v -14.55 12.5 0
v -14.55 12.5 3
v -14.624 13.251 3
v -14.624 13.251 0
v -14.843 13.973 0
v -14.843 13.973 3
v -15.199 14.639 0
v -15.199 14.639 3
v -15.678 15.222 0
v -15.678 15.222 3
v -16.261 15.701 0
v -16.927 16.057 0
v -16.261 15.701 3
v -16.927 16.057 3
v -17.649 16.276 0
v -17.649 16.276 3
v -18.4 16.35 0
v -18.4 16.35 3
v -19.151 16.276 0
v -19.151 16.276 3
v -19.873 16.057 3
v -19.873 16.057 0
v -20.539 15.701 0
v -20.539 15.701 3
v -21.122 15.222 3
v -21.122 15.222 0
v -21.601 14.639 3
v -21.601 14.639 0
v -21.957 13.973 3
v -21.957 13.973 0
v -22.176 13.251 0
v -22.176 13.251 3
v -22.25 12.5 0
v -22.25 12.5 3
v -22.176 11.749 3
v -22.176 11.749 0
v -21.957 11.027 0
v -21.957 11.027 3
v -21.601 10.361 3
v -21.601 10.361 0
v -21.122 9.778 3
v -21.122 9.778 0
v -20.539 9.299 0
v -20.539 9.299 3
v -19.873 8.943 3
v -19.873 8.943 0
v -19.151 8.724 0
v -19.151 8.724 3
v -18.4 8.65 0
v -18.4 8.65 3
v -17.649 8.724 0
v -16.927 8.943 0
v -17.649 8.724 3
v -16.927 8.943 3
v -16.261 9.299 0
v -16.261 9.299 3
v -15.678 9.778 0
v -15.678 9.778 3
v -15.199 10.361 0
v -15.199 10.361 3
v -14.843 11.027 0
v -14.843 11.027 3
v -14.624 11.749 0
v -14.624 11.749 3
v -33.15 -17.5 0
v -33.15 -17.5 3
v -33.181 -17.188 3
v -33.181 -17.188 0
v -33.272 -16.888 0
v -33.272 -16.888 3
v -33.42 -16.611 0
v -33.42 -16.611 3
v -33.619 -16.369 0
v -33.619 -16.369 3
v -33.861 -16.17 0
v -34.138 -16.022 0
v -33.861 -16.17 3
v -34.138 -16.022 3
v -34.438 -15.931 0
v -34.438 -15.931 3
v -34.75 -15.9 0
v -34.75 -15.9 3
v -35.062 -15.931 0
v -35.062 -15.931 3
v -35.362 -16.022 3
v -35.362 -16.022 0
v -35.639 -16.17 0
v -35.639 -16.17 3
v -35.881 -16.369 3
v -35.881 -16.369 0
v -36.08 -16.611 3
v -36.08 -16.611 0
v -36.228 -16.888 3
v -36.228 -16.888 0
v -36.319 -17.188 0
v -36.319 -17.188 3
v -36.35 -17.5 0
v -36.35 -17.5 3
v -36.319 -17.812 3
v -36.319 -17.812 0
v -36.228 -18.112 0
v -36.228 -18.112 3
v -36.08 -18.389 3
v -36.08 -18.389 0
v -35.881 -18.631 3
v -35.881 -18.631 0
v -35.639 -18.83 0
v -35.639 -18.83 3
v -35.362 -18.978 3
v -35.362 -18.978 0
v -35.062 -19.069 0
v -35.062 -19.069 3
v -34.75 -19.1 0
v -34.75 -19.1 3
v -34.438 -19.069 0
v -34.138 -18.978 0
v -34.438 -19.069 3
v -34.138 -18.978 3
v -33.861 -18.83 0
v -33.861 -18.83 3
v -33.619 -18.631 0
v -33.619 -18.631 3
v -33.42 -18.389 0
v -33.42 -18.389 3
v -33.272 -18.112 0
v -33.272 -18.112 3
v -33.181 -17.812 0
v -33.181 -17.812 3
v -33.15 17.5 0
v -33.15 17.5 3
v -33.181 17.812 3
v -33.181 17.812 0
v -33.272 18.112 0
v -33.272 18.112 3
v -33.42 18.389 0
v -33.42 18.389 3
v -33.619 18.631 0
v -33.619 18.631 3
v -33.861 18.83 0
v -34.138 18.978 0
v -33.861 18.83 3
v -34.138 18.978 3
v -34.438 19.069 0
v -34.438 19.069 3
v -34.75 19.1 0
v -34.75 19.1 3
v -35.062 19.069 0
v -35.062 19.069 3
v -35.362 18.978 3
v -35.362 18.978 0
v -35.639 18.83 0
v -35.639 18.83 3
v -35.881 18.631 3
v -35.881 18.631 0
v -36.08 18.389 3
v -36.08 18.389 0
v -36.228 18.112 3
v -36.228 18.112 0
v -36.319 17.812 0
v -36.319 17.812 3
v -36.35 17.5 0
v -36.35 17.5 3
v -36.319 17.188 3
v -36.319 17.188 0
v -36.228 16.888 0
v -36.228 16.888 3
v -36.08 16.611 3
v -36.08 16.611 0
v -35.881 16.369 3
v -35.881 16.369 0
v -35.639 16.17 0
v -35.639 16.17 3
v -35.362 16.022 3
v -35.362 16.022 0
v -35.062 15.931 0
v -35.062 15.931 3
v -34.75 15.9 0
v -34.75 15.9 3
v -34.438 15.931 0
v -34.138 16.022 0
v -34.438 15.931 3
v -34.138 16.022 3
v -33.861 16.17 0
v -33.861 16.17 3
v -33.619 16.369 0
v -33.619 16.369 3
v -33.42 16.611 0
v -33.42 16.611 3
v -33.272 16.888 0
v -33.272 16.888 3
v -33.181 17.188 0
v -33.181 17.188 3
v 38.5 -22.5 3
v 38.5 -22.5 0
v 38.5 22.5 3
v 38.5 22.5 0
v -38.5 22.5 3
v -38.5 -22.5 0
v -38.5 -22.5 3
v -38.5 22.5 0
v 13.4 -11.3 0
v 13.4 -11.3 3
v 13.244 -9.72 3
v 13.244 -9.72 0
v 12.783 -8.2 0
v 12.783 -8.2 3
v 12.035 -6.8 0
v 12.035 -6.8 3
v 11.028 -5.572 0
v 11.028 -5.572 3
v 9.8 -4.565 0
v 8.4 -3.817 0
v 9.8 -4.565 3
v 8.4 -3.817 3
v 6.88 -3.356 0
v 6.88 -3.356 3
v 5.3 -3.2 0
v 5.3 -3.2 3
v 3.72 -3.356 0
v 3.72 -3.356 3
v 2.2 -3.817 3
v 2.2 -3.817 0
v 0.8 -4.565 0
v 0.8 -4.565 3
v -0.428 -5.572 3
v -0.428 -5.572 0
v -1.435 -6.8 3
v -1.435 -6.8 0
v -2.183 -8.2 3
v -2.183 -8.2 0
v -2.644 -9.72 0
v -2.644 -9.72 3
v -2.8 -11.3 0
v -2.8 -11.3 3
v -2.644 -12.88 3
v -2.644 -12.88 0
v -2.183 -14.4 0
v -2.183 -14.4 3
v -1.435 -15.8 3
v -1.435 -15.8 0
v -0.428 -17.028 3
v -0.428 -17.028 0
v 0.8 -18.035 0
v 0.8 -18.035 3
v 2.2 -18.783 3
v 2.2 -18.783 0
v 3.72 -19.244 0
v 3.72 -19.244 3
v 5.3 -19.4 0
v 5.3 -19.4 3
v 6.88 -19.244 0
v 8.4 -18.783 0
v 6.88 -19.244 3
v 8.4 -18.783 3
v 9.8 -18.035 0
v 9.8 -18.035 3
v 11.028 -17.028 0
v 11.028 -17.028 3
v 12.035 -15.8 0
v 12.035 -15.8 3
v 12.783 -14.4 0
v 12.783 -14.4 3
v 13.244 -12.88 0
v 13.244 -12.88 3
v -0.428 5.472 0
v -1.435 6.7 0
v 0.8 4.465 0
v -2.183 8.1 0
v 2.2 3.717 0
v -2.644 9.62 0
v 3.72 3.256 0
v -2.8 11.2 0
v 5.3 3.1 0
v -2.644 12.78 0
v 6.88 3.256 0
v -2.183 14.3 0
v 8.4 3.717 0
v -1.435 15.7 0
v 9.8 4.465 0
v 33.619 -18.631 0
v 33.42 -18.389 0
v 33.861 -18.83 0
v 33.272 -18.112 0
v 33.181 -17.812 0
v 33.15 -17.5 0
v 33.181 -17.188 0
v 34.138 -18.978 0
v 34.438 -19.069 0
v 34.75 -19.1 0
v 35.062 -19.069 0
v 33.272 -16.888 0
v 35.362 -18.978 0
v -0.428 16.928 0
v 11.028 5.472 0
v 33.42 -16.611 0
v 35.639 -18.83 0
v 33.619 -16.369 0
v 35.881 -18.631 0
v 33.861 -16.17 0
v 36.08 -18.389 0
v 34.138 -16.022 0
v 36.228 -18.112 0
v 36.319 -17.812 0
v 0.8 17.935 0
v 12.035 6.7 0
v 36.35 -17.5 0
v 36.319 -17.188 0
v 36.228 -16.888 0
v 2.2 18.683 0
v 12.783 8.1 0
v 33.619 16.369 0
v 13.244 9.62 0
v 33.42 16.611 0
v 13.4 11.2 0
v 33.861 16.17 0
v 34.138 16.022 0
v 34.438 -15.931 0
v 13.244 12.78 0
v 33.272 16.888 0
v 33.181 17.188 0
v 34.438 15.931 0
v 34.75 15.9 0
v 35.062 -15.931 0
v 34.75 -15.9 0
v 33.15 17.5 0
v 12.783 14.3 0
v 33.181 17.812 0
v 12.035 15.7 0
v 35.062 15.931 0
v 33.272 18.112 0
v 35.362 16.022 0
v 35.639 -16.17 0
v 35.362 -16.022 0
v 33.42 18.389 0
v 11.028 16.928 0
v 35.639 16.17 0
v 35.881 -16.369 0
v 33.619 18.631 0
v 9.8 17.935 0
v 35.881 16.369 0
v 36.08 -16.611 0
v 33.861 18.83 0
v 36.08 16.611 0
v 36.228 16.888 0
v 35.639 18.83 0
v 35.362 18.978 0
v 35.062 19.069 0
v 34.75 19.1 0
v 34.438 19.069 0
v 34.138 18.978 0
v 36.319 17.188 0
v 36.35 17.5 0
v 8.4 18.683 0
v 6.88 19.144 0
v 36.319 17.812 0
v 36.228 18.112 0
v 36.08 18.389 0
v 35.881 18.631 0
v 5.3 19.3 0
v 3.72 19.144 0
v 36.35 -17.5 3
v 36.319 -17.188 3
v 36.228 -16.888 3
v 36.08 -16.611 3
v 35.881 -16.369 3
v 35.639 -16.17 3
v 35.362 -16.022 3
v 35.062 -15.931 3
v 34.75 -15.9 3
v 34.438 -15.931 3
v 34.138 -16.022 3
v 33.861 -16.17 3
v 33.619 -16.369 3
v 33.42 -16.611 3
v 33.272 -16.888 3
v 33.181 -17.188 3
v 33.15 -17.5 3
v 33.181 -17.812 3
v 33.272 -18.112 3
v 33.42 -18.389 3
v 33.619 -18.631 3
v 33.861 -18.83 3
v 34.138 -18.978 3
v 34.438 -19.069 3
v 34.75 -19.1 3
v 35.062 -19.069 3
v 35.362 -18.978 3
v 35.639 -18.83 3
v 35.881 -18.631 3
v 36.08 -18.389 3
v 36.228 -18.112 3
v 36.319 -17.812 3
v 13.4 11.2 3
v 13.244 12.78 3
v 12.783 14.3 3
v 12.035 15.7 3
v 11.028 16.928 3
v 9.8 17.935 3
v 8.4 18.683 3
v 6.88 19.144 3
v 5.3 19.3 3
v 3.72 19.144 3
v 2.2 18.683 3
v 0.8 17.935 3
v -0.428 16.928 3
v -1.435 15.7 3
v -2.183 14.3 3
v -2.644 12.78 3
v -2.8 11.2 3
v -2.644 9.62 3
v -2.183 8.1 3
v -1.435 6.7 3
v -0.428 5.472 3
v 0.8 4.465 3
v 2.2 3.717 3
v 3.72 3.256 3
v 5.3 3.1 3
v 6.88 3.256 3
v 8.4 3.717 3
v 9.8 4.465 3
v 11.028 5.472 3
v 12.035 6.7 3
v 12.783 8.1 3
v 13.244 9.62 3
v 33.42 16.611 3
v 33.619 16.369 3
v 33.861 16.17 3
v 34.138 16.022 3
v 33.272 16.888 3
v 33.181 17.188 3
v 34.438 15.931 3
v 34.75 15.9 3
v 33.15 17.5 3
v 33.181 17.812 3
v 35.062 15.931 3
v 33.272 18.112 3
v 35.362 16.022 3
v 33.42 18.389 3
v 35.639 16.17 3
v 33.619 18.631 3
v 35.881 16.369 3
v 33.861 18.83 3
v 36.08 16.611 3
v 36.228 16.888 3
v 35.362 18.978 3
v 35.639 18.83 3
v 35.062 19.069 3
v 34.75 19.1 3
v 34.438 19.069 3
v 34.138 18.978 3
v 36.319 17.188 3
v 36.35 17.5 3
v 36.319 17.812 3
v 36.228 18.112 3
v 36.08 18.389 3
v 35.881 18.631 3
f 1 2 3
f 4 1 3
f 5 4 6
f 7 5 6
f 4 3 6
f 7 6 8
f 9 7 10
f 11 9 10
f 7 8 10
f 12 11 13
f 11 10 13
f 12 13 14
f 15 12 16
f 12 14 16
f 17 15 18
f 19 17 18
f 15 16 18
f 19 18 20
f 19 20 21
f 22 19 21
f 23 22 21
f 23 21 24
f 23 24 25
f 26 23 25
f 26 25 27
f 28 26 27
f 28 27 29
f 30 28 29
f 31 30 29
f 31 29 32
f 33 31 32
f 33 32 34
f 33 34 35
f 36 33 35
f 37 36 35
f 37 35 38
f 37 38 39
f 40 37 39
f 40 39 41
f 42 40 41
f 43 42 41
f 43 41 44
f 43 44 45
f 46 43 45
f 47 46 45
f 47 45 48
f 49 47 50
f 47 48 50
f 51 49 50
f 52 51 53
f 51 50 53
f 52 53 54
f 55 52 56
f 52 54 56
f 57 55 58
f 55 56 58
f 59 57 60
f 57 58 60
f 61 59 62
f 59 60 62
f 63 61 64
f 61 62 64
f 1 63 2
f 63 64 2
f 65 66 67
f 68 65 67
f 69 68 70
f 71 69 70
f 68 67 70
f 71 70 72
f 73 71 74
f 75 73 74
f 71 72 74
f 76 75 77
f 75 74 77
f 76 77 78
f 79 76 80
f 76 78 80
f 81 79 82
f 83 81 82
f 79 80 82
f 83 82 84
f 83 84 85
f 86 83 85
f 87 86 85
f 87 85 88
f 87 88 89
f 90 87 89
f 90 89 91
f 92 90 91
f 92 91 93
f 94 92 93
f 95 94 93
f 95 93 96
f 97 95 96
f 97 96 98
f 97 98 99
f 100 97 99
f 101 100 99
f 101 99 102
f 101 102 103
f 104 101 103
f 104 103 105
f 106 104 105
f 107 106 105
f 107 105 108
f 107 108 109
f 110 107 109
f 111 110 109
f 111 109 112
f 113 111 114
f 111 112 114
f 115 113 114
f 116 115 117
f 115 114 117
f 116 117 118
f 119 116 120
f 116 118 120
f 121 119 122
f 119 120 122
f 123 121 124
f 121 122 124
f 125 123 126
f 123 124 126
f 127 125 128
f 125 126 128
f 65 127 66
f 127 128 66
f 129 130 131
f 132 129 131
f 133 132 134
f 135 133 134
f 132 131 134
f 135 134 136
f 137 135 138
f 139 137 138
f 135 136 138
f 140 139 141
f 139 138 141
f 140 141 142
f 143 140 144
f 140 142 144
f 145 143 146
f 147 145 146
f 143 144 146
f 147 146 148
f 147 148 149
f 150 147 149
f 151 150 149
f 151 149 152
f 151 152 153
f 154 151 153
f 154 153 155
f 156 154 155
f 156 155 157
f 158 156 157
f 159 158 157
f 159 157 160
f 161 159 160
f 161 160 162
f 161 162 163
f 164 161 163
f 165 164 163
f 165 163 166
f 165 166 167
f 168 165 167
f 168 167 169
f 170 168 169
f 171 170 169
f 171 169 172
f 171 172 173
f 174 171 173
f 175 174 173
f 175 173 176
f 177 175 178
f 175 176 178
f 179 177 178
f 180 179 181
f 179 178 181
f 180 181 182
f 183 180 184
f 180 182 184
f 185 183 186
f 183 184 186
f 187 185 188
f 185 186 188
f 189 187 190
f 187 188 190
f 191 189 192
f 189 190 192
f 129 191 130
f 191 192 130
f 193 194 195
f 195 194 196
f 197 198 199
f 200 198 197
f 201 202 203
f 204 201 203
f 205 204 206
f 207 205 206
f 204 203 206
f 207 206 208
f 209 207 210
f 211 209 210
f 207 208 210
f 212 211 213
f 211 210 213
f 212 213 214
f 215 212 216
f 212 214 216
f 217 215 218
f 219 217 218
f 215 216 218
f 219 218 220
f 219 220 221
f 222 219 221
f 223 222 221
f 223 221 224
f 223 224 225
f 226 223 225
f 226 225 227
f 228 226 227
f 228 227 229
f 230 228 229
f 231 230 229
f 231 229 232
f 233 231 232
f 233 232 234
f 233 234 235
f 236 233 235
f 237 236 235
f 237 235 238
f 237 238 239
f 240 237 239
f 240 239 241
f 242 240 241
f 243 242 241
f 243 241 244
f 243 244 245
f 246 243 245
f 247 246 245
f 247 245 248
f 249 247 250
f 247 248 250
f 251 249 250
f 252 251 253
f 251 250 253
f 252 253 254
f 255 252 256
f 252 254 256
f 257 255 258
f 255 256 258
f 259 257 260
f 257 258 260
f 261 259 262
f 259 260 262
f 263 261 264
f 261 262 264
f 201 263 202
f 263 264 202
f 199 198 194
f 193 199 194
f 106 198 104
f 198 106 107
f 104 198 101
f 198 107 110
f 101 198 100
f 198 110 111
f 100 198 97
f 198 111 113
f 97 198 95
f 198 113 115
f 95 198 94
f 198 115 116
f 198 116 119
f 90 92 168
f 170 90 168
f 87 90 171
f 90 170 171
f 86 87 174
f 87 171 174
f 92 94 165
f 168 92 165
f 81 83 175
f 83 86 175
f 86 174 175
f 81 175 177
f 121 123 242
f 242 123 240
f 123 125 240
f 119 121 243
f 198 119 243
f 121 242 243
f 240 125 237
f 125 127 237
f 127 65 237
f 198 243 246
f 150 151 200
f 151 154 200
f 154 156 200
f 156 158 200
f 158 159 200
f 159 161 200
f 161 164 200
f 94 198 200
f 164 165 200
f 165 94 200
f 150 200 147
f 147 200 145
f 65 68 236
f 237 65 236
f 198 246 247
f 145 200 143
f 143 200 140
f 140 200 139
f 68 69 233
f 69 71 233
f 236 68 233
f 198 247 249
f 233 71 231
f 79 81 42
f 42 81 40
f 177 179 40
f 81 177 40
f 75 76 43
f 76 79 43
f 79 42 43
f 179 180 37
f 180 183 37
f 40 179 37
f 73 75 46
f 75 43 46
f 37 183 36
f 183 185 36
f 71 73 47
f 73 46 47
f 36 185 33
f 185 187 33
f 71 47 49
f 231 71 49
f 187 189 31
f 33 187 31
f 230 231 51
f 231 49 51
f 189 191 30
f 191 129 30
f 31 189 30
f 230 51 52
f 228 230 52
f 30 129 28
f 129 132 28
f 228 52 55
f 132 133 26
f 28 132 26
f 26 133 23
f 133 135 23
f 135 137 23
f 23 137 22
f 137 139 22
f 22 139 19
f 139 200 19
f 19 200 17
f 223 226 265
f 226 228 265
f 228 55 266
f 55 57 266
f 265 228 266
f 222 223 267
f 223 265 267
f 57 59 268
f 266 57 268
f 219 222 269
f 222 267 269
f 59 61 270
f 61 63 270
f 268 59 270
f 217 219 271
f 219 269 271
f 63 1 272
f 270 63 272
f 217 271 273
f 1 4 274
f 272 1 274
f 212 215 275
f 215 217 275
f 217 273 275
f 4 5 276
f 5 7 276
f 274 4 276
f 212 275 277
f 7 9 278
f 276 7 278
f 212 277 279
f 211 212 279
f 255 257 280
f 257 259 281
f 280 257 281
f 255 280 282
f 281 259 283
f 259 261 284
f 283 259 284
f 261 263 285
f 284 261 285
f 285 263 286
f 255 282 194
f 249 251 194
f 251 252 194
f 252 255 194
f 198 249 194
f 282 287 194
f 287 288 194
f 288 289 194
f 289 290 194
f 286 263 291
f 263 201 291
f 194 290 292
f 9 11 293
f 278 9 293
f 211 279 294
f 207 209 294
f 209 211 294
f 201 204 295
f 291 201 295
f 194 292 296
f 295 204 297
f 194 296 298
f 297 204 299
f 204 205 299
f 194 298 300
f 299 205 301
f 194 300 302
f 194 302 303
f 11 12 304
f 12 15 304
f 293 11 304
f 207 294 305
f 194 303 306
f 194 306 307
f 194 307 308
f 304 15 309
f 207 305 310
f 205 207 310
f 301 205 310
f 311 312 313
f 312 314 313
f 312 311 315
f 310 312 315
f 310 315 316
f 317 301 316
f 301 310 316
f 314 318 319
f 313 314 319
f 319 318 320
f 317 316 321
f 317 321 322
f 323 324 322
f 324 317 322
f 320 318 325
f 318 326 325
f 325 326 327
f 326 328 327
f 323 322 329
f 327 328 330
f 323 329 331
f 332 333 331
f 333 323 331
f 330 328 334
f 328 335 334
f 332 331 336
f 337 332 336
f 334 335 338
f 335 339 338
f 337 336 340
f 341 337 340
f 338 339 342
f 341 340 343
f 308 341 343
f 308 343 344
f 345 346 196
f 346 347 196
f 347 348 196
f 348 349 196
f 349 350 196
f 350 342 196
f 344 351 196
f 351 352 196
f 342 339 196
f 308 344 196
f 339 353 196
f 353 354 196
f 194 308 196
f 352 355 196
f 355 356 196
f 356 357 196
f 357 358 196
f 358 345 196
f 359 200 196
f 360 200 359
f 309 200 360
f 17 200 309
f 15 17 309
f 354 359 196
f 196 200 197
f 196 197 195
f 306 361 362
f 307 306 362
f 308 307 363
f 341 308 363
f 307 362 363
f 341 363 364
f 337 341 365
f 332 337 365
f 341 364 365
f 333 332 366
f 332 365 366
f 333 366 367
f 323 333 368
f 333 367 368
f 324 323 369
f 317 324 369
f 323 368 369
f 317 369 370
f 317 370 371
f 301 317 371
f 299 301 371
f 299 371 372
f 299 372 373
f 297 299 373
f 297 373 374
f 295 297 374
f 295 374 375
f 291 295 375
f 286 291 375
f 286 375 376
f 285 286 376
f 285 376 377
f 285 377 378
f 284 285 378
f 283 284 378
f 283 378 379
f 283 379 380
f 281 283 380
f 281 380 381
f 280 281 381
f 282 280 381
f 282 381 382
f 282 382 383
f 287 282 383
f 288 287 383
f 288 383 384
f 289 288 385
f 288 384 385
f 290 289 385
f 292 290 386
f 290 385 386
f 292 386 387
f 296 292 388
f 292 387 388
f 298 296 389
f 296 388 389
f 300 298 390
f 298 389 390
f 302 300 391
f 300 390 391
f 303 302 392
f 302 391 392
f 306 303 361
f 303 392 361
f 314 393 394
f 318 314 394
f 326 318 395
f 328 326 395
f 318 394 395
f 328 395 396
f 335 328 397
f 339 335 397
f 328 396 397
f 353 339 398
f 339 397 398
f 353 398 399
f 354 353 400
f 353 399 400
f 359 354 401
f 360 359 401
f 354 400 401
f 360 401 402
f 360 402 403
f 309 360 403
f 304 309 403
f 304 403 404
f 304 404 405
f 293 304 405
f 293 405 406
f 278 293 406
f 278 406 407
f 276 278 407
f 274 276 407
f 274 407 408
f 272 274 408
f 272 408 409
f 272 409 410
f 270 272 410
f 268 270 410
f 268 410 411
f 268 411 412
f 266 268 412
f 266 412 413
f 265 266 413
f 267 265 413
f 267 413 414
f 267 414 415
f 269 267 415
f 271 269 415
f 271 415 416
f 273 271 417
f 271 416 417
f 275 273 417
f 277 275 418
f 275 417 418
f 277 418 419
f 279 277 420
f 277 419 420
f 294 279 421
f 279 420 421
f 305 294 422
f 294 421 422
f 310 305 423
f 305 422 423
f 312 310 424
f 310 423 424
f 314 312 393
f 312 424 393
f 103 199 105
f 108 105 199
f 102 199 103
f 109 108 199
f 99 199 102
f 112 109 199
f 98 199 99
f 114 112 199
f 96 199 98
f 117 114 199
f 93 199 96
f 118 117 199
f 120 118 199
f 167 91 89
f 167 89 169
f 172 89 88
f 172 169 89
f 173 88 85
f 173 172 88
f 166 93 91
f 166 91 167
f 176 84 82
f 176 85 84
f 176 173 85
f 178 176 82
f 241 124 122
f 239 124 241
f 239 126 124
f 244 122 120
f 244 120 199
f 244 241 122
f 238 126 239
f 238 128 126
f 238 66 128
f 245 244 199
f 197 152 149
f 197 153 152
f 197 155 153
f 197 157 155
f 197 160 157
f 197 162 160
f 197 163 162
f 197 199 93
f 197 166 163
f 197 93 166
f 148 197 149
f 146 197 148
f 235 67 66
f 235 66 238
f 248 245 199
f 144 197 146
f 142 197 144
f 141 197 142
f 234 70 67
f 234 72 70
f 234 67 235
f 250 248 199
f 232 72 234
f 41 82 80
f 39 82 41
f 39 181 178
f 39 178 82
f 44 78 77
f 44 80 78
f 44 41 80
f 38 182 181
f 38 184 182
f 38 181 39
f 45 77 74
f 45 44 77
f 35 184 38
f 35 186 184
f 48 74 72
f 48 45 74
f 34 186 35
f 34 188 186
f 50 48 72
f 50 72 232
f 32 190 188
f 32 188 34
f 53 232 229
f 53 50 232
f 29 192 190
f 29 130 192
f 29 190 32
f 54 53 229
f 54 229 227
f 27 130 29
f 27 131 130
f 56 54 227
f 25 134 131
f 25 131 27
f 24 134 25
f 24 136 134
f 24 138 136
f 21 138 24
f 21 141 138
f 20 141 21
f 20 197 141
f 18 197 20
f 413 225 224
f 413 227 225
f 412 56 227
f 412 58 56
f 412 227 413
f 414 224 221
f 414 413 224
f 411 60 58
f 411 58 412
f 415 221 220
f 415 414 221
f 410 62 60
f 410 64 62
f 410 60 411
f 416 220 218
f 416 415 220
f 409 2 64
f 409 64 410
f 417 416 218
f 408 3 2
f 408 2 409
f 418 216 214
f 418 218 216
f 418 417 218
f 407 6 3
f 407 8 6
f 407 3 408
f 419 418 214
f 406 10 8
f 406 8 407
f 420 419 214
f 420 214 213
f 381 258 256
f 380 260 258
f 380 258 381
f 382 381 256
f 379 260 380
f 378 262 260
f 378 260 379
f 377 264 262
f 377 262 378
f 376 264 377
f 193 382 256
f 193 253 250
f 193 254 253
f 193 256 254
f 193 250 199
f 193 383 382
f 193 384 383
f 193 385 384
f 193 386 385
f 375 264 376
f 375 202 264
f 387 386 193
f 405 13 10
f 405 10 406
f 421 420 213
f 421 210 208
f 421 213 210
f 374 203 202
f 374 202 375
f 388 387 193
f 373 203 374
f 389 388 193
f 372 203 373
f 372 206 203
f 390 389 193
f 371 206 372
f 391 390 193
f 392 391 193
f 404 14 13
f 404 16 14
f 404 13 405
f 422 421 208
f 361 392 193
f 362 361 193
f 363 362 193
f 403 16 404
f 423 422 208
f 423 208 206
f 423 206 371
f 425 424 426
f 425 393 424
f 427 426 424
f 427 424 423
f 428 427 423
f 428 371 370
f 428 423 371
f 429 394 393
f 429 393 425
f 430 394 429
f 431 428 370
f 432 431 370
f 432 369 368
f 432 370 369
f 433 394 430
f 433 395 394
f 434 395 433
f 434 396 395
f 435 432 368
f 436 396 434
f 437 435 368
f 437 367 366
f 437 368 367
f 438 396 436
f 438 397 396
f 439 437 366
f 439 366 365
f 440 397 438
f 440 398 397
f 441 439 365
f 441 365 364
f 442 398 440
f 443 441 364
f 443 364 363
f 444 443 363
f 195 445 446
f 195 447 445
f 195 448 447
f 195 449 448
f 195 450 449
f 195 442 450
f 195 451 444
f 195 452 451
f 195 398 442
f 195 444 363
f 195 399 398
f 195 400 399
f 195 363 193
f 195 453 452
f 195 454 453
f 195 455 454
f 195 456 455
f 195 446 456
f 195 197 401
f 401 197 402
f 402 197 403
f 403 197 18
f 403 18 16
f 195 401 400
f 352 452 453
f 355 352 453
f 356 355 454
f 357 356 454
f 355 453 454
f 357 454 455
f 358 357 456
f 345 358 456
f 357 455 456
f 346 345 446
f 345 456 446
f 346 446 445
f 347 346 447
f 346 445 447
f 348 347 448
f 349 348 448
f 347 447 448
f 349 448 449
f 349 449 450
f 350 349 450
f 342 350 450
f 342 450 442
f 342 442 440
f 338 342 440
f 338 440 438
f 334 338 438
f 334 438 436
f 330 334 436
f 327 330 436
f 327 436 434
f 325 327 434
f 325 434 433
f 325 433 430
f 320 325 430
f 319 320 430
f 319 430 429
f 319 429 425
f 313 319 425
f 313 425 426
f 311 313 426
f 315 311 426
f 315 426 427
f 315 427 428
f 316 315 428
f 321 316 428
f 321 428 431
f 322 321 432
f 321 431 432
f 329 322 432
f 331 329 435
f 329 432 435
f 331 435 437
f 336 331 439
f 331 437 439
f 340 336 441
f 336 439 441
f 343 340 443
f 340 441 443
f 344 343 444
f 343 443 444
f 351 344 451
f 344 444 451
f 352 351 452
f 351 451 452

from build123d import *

# Parameters (mm, degrees)
CROQUIS1_W              = 77
CROQUIS1_H              = 45
SALIENTE_EXTRUIR1_DEPTH = 3
CORTAR_EXTRUIR1_REACH   = 5
CROQUIS2_R              = 8.1
CROQUIS2_R_2            = 3.85
CROQUIS2_R_3            = 1.6


with BuildPart() as part:
    # Croquis1 → Saliente-Extruir1 (new body)
    with BuildSketch(Plane.XY):
        Rectangle(CROQUIS1_W, CROQUIS1_H)
    extrude(amount=SALIENTE_EXTRUIR1_DEPTH)

    # Croquis2 → Cortar-Extruir1 (cut, up to next)
    with BuildSketch(Plane.XY.offset(3), mode=Mode.PRIVATE) as cortar_extruir1_sk1:
        with Locations((5.3, 11.2)):
            Circle(CROQUIS2_R)
    cortar_extruir1_tool1 = extrude(cortar_extruir1_sk1.sketch, amount=-CORTAR_EXTRUIR1_REACH, mode=Mode.PRIVATE) & part.part
    add(cortar_extruir1_tool1.solids().sort_by_distance((5.3, 11.2, 3))[0], mode=Mode.SUBTRACT)
    # Croquis2 → Cortar-Extruir1 (cut, up to next)
    with BuildSketch(Plane.XY.offset(3), mode=Mode.PRIVATE) as cortar_extruir1_sk2:
        with Locations((5.3, -11.3)):
            Circle(CROQUIS2_R)
    cortar_extruir1_tool2 = extrude(cortar_extruir1_sk2.sketch, amount=-CORTAR_EXTRUIR1_REACH, mode=Mode.PRIVATE) & part.part
    add(cortar_extruir1_tool2.solids().sort_by_distance((5.3, -11.3, 3))[0], mode=Mode.SUBTRACT)
    # Croquis2 → Cortar-Extruir1 (cut, up to next)
    with BuildSketch(Plane.XY.offset(3), mode=Mode.PRIVATE) as cortar_extruir1_sk3:
        with Locations((-18.4, 12.5)):
            Circle(CROQUIS2_R_2)
    cortar_extruir1_tool3 = extrude(cortar_extruir1_sk3.sketch, amount=-CORTAR_EXTRUIR1_REACH, mode=Mode.PRIVATE) & part.part
    add(cortar_extruir1_tool3.solids().sort_by_distance((-18.4, 12.5, 3))[0], mode=Mode.SUBTRACT)
    # Croquis2 → Cortar-Extruir1 (cut, up to next)
    with BuildSketch(Plane.XY.offset(3), mode=Mode.PRIVATE) as cortar_extruir1_sk4:
        with Locations((-34.75, 17.5)):
            Circle(CROQUIS2_R_3)
    cortar_extruir1_tool4 = extrude(cortar_extruir1_sk4.sketch, amount=-CORTAR_EXTRUIR1_REACH, mode=Mode.PRIVATE) & part.part
    add(cortar_extruir1_tool4.solids().sort_by_distance((-34.75, 17.5, 3))[0], mode=Mode.SUBTRACT)
    # Croquis2 → Cortar-Extruir1 (cut, up to next)
    with BuildSketch(Plane.XY.offset(3), mode=Mode.PRIVATE) as cortar_extruir1_sk5:
        with Locations((34.75, 17.5)):
            Circle(CROQUIS2_R_3)
    cortar_extruir1_tool5 = extrude(cortar_extruir1_sk5.sketch, amount=-CORTAR_EXTRUIR1_REACH, mode=Mode.PRIVATE) & part.part
    add(cortar_extruir1_tool5.solids().sort_by_distance((34.75, 17.5, 3))[0], mode=Mode.SUBTRACT)
    # Croquis2 → Cortar-Extruir1 (cut, up to next)
    with BuildSketch(Plane.XY.offset(3), mode=Mode.PRIVATE) as cortar_extruir1_sk6:
        with Locations((34.75, -17.5)):
            Circle(CROQUIS2_R_3)
    cortar_extruir1_tool6 = extrude(cortar_extruir1_sk6.sketch, amount=-CORTAR_EXTRUIR1_REACH, mode=Mode.PRIVATE) & part.part
    add(cortar_extruir1_tool6.solids().sort_by_distance((34.75, -17.5, 3))[0], mode=Mode.SUBTRACT)
    # Croquis2 → Cortar-Extruir1 (cut, up to next)
    with BuildSketch(Plane.XY.offset(3), mode=Mode.PRIVATE) as cortar_extruir1_sk7:
        with Locations((-34.75, -17.5)):
            Circle(CROQUIS2_R_3)
    cortar_extruir1_tool7 = extrude(cortar_extruir1_sk7.sketch, amount=-CORTAR_EXTRUIR1_REACH, mode=Mode.PRIVATE) & part.part
    add(cortar_extruir1_tool7.solids().sort_by_distance((-34.75, -17.5, 3))[0], mode=Mode.SUBTRACT)


solid = part.part
